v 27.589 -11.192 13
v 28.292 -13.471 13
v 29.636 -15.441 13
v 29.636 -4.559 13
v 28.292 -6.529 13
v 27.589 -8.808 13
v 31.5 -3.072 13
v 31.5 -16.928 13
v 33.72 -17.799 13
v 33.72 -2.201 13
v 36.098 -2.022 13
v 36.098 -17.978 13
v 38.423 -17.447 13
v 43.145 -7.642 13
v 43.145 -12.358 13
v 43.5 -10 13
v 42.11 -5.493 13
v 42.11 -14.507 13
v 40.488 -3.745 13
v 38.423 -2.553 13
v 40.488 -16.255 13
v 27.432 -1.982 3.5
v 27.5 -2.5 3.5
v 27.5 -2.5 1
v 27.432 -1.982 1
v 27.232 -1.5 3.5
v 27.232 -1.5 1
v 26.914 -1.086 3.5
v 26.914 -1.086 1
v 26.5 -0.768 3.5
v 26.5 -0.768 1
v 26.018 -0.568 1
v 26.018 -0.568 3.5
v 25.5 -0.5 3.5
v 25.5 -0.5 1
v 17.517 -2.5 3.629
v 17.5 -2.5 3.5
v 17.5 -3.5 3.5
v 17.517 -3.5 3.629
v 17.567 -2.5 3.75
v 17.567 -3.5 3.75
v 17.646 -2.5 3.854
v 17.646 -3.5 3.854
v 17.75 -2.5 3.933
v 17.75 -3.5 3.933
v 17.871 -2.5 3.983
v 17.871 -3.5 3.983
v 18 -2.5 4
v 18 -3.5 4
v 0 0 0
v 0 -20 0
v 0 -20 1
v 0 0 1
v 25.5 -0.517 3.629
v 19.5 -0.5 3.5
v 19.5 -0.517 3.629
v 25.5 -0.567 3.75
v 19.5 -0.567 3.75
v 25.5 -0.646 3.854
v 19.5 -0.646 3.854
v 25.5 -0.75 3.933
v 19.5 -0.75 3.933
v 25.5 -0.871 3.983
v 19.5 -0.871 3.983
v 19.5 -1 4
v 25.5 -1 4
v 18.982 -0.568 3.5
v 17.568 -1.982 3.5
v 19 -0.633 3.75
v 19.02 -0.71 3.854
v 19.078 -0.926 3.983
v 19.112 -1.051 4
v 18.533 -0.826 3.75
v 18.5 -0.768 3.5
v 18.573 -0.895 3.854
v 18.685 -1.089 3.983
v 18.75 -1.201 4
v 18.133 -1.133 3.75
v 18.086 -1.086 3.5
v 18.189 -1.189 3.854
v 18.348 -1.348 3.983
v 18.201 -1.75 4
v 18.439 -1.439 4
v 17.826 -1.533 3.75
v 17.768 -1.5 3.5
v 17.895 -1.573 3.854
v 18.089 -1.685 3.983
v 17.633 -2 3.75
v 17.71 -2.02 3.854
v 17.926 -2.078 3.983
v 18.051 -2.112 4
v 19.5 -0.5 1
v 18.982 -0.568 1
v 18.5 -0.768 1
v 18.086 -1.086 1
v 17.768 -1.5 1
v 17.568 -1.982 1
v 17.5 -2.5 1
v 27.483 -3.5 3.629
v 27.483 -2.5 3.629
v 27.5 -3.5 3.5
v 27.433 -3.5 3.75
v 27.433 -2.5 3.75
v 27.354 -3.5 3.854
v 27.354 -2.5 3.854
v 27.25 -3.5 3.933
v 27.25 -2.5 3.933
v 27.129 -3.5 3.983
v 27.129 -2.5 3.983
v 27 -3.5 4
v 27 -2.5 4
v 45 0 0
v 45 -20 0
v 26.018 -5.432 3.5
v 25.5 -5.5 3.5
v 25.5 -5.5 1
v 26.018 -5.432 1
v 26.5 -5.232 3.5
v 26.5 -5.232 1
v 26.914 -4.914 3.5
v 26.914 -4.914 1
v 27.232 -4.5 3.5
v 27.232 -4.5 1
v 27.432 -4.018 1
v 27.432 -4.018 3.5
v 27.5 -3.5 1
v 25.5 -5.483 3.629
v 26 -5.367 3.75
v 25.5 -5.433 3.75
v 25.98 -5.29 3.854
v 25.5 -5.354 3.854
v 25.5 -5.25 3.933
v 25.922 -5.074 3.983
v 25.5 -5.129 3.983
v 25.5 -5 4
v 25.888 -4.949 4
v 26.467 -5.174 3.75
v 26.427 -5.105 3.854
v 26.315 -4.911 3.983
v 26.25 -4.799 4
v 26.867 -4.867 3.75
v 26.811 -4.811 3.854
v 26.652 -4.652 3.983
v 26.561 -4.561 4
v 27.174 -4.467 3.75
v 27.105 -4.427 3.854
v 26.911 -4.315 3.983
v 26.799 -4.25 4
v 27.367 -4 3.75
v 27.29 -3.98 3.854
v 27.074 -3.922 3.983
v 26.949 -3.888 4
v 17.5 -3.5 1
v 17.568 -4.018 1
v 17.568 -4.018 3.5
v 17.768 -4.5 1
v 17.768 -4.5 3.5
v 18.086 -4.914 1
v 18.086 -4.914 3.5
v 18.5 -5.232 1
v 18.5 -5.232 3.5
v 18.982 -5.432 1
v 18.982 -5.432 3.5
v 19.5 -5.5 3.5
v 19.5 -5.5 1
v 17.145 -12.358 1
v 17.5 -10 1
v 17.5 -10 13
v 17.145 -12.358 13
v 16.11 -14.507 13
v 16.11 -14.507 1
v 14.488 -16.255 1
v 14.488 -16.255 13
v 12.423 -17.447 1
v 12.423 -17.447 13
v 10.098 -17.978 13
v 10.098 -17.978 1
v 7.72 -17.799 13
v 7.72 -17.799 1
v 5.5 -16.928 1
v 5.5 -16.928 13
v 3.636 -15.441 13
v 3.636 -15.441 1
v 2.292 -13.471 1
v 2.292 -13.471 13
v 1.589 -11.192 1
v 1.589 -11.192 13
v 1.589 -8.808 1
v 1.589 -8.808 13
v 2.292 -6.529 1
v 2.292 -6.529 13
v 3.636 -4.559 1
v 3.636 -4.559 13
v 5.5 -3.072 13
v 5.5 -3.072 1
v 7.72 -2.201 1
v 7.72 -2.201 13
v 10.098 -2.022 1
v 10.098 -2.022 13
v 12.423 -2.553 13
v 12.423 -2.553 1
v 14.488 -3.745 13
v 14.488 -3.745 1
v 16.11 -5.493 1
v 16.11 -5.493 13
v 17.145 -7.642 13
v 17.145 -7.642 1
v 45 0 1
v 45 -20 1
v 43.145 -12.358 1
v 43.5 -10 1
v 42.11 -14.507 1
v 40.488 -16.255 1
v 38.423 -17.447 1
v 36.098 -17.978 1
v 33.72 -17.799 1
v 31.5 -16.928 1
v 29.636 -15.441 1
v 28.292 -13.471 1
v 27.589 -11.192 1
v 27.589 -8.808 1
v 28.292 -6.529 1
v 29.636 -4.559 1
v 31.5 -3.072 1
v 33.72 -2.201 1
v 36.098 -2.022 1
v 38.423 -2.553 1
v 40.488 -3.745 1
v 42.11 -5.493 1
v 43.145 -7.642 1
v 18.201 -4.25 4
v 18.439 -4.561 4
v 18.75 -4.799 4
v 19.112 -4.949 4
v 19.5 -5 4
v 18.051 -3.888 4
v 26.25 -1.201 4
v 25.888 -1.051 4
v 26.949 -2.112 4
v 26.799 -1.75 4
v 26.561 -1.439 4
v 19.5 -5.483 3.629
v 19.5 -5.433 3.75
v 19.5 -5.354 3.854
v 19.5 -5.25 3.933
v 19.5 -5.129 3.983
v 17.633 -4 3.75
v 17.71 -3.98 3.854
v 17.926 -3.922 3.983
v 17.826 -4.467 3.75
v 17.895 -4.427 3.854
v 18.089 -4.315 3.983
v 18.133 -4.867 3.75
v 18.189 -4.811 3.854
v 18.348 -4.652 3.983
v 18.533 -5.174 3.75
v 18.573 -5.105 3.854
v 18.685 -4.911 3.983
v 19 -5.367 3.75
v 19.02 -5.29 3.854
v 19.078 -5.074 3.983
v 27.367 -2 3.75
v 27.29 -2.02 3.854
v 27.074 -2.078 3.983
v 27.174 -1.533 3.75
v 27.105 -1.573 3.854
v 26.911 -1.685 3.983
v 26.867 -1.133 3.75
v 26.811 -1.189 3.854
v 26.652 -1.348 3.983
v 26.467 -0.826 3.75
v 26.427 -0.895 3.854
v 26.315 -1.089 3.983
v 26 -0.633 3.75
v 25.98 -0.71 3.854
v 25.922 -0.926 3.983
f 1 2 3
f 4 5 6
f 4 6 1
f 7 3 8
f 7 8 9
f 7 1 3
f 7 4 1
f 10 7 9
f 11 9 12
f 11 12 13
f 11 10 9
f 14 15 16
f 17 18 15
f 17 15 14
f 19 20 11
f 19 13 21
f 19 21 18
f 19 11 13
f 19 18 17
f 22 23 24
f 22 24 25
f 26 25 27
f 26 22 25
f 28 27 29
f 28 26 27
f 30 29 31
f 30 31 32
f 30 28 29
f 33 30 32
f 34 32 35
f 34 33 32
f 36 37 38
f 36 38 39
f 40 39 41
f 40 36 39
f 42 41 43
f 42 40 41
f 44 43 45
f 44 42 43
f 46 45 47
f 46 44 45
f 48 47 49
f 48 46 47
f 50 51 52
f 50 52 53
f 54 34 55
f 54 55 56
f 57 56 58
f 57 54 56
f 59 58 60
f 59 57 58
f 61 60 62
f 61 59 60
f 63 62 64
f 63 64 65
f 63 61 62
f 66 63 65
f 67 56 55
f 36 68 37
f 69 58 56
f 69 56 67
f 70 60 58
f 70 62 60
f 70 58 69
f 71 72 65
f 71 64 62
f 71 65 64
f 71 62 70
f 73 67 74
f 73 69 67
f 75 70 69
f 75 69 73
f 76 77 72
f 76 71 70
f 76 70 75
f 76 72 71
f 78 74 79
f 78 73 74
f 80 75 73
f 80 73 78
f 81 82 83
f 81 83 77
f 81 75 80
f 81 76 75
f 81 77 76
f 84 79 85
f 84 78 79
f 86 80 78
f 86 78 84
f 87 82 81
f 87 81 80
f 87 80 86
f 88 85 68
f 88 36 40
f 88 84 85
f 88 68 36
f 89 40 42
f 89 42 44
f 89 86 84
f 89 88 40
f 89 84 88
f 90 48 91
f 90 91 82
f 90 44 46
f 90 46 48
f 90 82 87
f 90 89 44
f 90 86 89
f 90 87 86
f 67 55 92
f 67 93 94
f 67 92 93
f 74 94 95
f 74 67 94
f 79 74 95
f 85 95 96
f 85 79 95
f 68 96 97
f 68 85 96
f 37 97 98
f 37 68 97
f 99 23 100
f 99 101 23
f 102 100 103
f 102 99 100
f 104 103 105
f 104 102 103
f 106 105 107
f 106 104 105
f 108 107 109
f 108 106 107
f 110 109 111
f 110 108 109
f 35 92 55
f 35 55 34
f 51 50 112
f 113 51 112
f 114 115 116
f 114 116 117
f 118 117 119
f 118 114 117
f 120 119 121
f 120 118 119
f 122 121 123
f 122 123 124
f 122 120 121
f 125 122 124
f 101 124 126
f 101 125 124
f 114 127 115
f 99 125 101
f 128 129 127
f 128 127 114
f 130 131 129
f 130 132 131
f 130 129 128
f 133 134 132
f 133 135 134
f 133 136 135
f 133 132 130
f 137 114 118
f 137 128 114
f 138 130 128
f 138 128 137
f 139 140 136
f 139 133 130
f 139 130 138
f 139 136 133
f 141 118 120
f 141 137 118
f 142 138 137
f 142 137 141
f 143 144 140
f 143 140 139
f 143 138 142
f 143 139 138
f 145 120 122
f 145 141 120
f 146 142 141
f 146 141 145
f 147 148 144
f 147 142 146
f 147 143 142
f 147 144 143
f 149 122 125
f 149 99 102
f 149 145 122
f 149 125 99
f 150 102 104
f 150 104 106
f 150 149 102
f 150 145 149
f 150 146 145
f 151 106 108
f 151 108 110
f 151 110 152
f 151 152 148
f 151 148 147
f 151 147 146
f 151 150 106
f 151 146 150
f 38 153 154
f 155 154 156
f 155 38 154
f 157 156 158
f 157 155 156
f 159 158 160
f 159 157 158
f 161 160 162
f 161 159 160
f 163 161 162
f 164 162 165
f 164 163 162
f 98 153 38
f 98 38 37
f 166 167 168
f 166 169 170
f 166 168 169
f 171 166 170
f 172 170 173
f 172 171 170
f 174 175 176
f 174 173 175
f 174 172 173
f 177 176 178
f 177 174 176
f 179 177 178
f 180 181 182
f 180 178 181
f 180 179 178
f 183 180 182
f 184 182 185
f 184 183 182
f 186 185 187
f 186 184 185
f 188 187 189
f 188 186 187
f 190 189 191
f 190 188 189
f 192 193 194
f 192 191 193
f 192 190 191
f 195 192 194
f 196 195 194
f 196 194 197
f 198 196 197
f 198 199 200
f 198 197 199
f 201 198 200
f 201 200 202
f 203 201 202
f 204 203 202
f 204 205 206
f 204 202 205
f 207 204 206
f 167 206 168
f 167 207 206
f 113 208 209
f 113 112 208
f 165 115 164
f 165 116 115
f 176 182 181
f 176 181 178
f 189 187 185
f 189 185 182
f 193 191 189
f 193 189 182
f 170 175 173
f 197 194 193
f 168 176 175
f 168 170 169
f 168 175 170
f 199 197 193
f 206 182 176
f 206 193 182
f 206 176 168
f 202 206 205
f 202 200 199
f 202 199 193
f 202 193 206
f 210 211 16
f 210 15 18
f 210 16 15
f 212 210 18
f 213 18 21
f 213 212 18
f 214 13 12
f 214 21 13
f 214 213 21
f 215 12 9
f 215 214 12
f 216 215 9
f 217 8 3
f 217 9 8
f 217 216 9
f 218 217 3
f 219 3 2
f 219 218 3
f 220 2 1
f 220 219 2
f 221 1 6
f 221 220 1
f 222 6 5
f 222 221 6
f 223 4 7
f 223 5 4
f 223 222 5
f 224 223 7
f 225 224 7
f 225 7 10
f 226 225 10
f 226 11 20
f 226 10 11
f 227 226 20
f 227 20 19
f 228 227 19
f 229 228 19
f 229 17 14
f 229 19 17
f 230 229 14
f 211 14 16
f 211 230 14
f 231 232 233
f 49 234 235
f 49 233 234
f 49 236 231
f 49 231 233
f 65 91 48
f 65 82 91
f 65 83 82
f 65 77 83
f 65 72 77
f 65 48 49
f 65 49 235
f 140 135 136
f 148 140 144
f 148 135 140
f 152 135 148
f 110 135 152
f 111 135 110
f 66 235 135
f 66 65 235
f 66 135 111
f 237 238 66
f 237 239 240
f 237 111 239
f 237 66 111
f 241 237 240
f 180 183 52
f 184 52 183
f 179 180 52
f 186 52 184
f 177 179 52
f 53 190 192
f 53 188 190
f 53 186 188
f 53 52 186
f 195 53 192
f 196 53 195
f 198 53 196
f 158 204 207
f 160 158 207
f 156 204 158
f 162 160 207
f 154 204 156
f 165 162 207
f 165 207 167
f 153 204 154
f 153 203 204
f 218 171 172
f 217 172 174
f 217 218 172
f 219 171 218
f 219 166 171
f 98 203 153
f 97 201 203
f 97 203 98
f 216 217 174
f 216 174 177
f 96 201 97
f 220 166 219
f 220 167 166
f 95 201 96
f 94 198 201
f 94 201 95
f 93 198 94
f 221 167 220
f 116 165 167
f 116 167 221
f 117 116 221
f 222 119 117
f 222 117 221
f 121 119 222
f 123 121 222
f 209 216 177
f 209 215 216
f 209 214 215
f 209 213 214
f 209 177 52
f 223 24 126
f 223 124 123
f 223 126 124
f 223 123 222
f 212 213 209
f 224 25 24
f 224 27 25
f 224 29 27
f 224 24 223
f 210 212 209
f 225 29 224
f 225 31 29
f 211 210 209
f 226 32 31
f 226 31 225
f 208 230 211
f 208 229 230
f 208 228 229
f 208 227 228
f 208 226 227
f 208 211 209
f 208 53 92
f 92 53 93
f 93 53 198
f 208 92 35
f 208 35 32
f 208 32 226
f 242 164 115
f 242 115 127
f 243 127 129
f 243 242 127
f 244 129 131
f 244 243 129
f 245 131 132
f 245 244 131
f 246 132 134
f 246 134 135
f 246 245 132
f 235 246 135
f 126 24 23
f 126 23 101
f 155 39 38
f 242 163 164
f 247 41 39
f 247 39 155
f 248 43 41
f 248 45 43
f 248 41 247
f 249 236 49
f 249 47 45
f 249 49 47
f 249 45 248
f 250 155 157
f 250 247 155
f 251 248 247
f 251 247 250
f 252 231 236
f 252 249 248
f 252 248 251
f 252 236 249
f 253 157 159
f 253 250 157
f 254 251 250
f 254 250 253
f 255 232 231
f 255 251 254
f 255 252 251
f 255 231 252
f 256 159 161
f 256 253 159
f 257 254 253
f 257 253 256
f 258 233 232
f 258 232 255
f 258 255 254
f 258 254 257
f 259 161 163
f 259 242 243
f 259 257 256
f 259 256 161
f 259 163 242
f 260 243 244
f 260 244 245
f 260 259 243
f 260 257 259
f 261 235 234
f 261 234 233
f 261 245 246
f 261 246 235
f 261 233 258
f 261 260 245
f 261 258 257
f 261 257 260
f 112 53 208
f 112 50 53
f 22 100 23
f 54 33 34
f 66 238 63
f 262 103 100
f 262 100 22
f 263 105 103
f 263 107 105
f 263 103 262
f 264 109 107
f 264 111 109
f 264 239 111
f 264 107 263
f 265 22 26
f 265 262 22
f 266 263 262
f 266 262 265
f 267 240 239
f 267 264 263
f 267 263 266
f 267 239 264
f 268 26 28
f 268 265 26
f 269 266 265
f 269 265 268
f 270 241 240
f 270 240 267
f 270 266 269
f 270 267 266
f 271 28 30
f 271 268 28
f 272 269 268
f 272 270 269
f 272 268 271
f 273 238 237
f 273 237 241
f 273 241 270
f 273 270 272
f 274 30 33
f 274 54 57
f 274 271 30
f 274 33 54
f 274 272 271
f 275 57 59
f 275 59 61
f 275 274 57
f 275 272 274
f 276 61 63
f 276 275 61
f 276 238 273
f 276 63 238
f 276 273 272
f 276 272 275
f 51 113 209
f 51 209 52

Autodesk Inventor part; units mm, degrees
ref_plane "YZ Plane" through (0, 0, 0) normal (1, 0, 0) x (0, 1, 0)
ref_plane "XZ Plane" through (0, 0, 0) normal (0, 1, 0) x (-1, 0, 0)
ref_plane "XY Plane" through (0, 0, 0) normal (0, 0, 1) x (1, 0, 0)
sketch "Sketch1" plane through (0, 0, 0) normal (0, 0, 1) x (1, 0, 0)
  line L0 (0, 0) -> (45, 0)
  line L1 (45, 0) -> (45, -20)
  line L2 (45, -20) -> (0, -20)
  line L3 (0, -20) -> (0, 0)
  dimension "d0" = 45
  dimension "d1" = 20
extrude "Extrusion1" add sketch "Sketch1" along normal blind 1
sketch "Sketch2" plane through (0, 0, 1) normal (0, 0, 1) x (1, 0, 0)
  circle A0 centre (9.5, -10) radius 8
  circle A1 centre (35.5, -10) radius 8
  line L0 (0, -20) -> (45, -20) projected
  line L1 (0, 0) -> (0, -20) projected
  dimension "d4" = 16
  dimension "d5" = 16
  dimension "d6" = 26
  dimension "d7" = 10
  dimension "d8" = 9.5
extrude "Extrusion2" add sketch "Sketch2" along normal blind 12
sketch "Sketch3" plane through (0, 0, 1) normal (0, 0, 1) x (1, 0, 0)
  line L0 (17.5, -0.5) -> (27.5, -0.5)
  line L1 (27.5, -0.5) -> (27.5, -5.5)
  line L2 (27.5, -5.5) -> (17.5, -5.5)
  line L3 (17.5, -5.5) -> (17.5, -0.5)
  line L4 (0, 0) -> (0, -20) projected
  line L5 (45, 0) -> (0, 0) projected
  dimension "d11" = 10
  dimension "d12" = 5
  dimension "d13" = 17.5
  dimension "d14" = 0.5
extrude "Extrusion3" add sketch "Sketch3" along normal blind 3
fillet "Fillet1" radius 2 4 edges at (27.5, -0.5, 2.5) (27.5, -5.5, 2.5) (17.5, -0.5, 2.5) (17.5, -5.5, 2.5)
fillet "Fillet2" radius 0.5 8 edges at (17.5, -3, 4) (18.0858, -1.0858, 4) (22.5, -0.5, 4) (26.9142, -1.0858, 4) (27.5, -3, 4) (26.9142, -4.9142, 4) (22.5, -5.5, 4) (18.0858, -4.9142, 4)
sketch "Sketch4" plane through (0, 0, 0) normal (0, 0, -1) x (-1, 0, 0)
  point P0 (0, 0)
properties part number "UltrasonicSensor"
